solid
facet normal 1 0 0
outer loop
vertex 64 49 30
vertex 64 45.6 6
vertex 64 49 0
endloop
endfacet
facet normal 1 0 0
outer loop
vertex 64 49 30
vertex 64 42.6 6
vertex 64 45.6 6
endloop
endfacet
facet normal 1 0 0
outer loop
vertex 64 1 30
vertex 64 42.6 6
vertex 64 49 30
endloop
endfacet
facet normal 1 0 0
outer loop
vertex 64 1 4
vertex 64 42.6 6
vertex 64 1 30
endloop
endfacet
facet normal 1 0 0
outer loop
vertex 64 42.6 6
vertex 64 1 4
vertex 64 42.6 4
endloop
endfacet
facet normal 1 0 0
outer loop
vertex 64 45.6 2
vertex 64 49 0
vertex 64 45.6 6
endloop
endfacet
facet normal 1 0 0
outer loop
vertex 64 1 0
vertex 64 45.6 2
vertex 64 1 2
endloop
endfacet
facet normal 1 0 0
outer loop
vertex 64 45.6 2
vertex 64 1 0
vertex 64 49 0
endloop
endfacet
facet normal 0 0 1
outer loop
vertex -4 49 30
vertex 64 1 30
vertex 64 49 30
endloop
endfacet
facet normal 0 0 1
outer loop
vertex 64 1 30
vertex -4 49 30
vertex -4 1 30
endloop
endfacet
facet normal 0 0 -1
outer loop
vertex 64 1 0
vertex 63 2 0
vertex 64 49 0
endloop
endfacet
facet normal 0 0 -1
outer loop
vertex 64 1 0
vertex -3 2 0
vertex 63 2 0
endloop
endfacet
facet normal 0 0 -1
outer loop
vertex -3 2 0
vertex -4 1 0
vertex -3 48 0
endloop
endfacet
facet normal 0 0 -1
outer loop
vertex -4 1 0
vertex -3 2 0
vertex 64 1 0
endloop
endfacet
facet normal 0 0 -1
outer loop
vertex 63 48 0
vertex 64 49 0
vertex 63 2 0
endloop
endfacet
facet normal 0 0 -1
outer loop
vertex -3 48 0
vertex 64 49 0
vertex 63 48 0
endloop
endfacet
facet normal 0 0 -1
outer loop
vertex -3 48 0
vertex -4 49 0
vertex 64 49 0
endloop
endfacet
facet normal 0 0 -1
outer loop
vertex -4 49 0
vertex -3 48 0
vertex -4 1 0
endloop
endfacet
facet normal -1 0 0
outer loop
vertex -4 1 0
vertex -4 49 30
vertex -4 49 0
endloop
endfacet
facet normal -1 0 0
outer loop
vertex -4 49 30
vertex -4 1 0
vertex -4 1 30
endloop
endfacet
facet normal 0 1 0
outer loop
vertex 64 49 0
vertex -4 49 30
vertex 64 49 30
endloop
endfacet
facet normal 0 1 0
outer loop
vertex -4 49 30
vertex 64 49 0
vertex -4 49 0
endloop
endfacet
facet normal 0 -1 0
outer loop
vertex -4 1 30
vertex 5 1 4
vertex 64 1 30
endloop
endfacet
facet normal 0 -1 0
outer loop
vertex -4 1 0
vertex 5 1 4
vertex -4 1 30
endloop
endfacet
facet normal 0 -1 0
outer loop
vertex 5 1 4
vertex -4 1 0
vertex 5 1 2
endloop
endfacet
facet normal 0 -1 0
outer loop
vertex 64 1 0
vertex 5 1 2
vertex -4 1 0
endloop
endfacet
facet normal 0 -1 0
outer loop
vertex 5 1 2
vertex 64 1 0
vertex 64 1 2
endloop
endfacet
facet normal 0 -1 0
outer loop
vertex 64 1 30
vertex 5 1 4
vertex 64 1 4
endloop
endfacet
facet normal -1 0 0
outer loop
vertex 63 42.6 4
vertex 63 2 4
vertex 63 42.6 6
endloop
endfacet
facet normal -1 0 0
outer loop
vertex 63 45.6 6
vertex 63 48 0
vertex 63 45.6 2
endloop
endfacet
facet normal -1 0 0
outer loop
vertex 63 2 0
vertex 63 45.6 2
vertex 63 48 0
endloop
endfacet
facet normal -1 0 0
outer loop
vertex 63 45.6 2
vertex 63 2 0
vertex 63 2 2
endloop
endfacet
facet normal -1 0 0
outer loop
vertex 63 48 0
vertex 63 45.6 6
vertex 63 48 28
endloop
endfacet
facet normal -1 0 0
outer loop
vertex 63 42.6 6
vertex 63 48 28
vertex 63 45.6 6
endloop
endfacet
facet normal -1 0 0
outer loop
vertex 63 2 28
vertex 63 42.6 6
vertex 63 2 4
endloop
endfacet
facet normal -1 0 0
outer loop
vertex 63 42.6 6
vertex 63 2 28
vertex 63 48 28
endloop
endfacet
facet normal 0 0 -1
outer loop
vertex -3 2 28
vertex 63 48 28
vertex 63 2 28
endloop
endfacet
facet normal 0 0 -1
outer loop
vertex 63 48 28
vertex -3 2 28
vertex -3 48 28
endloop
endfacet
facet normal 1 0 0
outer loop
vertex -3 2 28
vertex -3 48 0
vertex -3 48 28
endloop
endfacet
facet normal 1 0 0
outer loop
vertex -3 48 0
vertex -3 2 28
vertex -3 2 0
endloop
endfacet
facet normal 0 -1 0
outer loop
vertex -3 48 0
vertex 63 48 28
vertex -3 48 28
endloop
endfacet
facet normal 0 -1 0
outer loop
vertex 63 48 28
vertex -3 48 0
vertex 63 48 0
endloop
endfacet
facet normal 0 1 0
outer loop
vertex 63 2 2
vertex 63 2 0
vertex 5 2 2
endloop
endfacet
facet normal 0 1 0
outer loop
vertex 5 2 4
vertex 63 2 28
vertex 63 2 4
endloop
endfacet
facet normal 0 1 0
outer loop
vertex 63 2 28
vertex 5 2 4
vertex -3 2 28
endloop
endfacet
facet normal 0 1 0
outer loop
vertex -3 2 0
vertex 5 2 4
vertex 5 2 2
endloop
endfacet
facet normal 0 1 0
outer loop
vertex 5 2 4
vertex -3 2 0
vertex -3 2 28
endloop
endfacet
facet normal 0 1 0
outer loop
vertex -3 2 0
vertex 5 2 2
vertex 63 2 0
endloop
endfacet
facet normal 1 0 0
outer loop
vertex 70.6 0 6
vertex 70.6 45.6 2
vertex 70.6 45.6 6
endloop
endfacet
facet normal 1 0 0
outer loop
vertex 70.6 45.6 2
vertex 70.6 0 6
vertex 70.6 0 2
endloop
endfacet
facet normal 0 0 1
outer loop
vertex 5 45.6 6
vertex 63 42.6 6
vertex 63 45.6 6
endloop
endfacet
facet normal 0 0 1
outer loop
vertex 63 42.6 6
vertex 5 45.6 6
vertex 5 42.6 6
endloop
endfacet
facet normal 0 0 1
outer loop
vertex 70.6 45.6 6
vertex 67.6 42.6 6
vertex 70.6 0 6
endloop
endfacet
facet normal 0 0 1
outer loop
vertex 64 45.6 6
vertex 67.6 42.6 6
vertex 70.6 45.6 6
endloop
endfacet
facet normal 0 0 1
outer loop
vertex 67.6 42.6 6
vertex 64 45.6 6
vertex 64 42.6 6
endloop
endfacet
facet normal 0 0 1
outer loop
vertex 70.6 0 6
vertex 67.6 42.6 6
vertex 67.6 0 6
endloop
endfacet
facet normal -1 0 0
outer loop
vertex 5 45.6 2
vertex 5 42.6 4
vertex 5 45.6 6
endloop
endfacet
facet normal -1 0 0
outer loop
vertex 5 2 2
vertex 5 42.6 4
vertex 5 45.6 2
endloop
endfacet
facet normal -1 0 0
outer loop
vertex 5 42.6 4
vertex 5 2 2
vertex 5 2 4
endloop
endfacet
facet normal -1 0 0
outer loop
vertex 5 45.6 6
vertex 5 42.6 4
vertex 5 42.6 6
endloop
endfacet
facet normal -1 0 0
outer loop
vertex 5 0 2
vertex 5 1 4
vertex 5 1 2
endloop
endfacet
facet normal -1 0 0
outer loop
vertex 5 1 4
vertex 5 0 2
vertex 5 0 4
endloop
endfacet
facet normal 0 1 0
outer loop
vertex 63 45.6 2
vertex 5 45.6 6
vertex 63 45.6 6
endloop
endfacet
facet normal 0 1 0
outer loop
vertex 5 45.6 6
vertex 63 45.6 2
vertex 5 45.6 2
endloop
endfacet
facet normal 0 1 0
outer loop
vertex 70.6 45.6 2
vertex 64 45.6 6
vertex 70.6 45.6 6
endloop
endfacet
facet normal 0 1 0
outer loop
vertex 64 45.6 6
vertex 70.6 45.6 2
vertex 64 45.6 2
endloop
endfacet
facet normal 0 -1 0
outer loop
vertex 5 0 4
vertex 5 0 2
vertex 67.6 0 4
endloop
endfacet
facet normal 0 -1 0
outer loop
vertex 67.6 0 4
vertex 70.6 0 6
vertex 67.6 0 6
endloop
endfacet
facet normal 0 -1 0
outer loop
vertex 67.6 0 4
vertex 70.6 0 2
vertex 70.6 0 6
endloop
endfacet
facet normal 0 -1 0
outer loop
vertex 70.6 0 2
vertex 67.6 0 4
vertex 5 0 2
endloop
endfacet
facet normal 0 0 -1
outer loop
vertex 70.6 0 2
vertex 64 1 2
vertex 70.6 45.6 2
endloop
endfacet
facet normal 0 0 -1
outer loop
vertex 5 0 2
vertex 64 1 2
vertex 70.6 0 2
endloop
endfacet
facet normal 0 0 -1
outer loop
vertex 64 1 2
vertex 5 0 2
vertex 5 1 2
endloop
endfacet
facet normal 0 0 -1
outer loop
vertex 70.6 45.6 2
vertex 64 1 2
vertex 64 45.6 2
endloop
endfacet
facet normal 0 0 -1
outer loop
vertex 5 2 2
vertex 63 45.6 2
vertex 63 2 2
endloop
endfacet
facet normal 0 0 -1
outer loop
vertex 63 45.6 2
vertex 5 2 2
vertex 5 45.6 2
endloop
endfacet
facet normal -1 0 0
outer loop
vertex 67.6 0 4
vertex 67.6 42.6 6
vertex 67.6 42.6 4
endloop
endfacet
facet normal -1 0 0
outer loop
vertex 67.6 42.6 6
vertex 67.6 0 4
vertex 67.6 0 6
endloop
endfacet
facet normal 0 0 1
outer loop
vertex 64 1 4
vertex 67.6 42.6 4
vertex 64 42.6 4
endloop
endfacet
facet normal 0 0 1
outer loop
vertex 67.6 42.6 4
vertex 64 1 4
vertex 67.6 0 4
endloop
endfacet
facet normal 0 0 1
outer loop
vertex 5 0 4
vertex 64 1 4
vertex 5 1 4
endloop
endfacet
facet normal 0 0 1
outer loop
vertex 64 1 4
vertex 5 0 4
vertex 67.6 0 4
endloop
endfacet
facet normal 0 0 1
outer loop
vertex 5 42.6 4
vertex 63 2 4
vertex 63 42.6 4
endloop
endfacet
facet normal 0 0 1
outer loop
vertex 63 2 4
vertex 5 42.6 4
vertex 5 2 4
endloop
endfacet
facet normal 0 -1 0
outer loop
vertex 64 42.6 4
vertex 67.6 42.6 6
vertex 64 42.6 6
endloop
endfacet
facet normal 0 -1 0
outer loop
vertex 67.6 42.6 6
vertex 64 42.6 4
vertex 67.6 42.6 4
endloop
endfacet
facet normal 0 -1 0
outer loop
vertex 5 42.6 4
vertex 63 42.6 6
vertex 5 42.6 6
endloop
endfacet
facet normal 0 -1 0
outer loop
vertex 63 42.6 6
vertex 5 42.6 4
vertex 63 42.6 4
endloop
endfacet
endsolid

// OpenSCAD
// Two-part enclosure for electronics board.
// Part 1: Box (left). Part 2: Lid (right, printed upside down).
// Both parts sit on the XY plane (Z=0) with a 10 mm gap.

// --- Dimensions ---
// Box outer dimensions (X, Y, Z)
box_w = 70;
box_h = 50;
box_d = 30;

// Wall and floor thickness
wall_t = 2;
floor_t = 2;

// Lid dimensions
lid_plate_t = 2;
lip_t = 1.5;
lip_h = 4;
// Lip outer size
lip_w = 65.6;
lip_h_dim = 45.6;

// Clearance
clearance = 0.2;

// Gap between parts
gap = 10;

// --- Derived Dimensions ---
// Box inner dimensions
box_w_in = box_w - 2 * wall_t;
box_h_in = box_h - 2 * wall_t;
box_d_in = box_d - floor_t; // Open top, so only bottom floor thickness

// Lid lip inner dimensions (to match box inner)
lip_w_in = box_w_in + 2 * clearance;
lip_h_dim_in = box_h_in + 2 * clearance;

// Lid lip outer dimensions (given)
lip_w_out = lip_w;
lip_h_dim_out = lip_h_dim;

// --- Main Module ---
module enclosure() {
    // Part 1: The Box
    // Position: Centered in Y, starts at X = -gap/2
    translate([-gap / 2, 0, 0]) {
        difference() {
            // Outer block
            translate([wall_t / 2, wall_t / 2, 0]) 
                cube([box_w - wall_t, box_h - wall_t, box_d]);
            
            // Inner void (open top)
            translate([wall_t, wall_t, 0]) 
                cube([box_w_in, box_h_in, box_d_in]);
        }
    }

    // Part 2: The Lid
    // Printed upside down, so the plate is on Z=0 and the lip points down (-Z).
    // Position: Centered in Y, starts at X = gap/2
    translate([gap / 2, 0, 0]) {
        difference() {
            // Outer block (Plate + Lip)
            // Plate is 70x50x2. Lip is 65.6x45.6x(2+4).
            // We build the whole block as one big cylinder/cube combo or just a big cube.
            // Let's use a big cube for simplicity, then cut.
            translate([0, 0, 0]) 
                cube([lip_w_out, lip_h_dim_out, lip_h + lid_plate_t]);
            
            // Cut out the plate hole (the space under the lip)
            // The plate is 70x50. The lip sits on top of it.
            // We need to remove the volume where the plate is, except for the lip.
            // Actually, simpler: Remove the plate volume (70x50x2) and the lip hole.
            
            // 1. Remove the plate volume (70x50x2)
            translate([0, 0, 0]) 
                cube([box_w, box_h, lid_plate_t]);
            
            // 2. Remove the lip hole (the space inside the lip)
            // The lip is centered.
            // Lip outer: 65.6 x 45.6. Lip inner: 65.6 x 45.6 (calculated above).
            // Wait, the lip outer is 65.6, inner is 65.6? No.
            // Lip outer is 65.6. Lip inner must be smaller to have walls.
            // Re-reading prompt: "lip ... whose outer size is 65.6 x 45.6 mm, centred on the plate, so it slides into the box opening with 0.2 mm clearance on each side."
            // Box inner is 66 x 46.
            // Lip outer is 65.6 x 45.6.
            // Clearance = (Box Inner - Lip Outer) / 2 = (66 - 65.6)/2 = 0.2. Correct.
            // So the lip outer is 65.6 x 45.6.
            // The lip inner (hole) must be Box Inner - 2*wall_thickness_of_lip.
            // Lip wall thickness is 1.5 mm.
            // Lip inner = 65.6 - 2*1.5 = 62.6.
            // Check: Box Inner (66) - Lip Outer (65.6) = 0.4 total clearance. 0.2 each side.
            // Lip Inner (62.6) vs Lip Outer (65.6). Wall = 1.5. Correct.
            
            // Cut the lip hole
            translate([0, 0, lip_h]) // Start at top of plate
                cube([lip_w_out - 2 * lip_t, lip_h_dim_out - 2 * lip_t, lip_h]);
        }
    }
}

// Render the parts
enclosure();
